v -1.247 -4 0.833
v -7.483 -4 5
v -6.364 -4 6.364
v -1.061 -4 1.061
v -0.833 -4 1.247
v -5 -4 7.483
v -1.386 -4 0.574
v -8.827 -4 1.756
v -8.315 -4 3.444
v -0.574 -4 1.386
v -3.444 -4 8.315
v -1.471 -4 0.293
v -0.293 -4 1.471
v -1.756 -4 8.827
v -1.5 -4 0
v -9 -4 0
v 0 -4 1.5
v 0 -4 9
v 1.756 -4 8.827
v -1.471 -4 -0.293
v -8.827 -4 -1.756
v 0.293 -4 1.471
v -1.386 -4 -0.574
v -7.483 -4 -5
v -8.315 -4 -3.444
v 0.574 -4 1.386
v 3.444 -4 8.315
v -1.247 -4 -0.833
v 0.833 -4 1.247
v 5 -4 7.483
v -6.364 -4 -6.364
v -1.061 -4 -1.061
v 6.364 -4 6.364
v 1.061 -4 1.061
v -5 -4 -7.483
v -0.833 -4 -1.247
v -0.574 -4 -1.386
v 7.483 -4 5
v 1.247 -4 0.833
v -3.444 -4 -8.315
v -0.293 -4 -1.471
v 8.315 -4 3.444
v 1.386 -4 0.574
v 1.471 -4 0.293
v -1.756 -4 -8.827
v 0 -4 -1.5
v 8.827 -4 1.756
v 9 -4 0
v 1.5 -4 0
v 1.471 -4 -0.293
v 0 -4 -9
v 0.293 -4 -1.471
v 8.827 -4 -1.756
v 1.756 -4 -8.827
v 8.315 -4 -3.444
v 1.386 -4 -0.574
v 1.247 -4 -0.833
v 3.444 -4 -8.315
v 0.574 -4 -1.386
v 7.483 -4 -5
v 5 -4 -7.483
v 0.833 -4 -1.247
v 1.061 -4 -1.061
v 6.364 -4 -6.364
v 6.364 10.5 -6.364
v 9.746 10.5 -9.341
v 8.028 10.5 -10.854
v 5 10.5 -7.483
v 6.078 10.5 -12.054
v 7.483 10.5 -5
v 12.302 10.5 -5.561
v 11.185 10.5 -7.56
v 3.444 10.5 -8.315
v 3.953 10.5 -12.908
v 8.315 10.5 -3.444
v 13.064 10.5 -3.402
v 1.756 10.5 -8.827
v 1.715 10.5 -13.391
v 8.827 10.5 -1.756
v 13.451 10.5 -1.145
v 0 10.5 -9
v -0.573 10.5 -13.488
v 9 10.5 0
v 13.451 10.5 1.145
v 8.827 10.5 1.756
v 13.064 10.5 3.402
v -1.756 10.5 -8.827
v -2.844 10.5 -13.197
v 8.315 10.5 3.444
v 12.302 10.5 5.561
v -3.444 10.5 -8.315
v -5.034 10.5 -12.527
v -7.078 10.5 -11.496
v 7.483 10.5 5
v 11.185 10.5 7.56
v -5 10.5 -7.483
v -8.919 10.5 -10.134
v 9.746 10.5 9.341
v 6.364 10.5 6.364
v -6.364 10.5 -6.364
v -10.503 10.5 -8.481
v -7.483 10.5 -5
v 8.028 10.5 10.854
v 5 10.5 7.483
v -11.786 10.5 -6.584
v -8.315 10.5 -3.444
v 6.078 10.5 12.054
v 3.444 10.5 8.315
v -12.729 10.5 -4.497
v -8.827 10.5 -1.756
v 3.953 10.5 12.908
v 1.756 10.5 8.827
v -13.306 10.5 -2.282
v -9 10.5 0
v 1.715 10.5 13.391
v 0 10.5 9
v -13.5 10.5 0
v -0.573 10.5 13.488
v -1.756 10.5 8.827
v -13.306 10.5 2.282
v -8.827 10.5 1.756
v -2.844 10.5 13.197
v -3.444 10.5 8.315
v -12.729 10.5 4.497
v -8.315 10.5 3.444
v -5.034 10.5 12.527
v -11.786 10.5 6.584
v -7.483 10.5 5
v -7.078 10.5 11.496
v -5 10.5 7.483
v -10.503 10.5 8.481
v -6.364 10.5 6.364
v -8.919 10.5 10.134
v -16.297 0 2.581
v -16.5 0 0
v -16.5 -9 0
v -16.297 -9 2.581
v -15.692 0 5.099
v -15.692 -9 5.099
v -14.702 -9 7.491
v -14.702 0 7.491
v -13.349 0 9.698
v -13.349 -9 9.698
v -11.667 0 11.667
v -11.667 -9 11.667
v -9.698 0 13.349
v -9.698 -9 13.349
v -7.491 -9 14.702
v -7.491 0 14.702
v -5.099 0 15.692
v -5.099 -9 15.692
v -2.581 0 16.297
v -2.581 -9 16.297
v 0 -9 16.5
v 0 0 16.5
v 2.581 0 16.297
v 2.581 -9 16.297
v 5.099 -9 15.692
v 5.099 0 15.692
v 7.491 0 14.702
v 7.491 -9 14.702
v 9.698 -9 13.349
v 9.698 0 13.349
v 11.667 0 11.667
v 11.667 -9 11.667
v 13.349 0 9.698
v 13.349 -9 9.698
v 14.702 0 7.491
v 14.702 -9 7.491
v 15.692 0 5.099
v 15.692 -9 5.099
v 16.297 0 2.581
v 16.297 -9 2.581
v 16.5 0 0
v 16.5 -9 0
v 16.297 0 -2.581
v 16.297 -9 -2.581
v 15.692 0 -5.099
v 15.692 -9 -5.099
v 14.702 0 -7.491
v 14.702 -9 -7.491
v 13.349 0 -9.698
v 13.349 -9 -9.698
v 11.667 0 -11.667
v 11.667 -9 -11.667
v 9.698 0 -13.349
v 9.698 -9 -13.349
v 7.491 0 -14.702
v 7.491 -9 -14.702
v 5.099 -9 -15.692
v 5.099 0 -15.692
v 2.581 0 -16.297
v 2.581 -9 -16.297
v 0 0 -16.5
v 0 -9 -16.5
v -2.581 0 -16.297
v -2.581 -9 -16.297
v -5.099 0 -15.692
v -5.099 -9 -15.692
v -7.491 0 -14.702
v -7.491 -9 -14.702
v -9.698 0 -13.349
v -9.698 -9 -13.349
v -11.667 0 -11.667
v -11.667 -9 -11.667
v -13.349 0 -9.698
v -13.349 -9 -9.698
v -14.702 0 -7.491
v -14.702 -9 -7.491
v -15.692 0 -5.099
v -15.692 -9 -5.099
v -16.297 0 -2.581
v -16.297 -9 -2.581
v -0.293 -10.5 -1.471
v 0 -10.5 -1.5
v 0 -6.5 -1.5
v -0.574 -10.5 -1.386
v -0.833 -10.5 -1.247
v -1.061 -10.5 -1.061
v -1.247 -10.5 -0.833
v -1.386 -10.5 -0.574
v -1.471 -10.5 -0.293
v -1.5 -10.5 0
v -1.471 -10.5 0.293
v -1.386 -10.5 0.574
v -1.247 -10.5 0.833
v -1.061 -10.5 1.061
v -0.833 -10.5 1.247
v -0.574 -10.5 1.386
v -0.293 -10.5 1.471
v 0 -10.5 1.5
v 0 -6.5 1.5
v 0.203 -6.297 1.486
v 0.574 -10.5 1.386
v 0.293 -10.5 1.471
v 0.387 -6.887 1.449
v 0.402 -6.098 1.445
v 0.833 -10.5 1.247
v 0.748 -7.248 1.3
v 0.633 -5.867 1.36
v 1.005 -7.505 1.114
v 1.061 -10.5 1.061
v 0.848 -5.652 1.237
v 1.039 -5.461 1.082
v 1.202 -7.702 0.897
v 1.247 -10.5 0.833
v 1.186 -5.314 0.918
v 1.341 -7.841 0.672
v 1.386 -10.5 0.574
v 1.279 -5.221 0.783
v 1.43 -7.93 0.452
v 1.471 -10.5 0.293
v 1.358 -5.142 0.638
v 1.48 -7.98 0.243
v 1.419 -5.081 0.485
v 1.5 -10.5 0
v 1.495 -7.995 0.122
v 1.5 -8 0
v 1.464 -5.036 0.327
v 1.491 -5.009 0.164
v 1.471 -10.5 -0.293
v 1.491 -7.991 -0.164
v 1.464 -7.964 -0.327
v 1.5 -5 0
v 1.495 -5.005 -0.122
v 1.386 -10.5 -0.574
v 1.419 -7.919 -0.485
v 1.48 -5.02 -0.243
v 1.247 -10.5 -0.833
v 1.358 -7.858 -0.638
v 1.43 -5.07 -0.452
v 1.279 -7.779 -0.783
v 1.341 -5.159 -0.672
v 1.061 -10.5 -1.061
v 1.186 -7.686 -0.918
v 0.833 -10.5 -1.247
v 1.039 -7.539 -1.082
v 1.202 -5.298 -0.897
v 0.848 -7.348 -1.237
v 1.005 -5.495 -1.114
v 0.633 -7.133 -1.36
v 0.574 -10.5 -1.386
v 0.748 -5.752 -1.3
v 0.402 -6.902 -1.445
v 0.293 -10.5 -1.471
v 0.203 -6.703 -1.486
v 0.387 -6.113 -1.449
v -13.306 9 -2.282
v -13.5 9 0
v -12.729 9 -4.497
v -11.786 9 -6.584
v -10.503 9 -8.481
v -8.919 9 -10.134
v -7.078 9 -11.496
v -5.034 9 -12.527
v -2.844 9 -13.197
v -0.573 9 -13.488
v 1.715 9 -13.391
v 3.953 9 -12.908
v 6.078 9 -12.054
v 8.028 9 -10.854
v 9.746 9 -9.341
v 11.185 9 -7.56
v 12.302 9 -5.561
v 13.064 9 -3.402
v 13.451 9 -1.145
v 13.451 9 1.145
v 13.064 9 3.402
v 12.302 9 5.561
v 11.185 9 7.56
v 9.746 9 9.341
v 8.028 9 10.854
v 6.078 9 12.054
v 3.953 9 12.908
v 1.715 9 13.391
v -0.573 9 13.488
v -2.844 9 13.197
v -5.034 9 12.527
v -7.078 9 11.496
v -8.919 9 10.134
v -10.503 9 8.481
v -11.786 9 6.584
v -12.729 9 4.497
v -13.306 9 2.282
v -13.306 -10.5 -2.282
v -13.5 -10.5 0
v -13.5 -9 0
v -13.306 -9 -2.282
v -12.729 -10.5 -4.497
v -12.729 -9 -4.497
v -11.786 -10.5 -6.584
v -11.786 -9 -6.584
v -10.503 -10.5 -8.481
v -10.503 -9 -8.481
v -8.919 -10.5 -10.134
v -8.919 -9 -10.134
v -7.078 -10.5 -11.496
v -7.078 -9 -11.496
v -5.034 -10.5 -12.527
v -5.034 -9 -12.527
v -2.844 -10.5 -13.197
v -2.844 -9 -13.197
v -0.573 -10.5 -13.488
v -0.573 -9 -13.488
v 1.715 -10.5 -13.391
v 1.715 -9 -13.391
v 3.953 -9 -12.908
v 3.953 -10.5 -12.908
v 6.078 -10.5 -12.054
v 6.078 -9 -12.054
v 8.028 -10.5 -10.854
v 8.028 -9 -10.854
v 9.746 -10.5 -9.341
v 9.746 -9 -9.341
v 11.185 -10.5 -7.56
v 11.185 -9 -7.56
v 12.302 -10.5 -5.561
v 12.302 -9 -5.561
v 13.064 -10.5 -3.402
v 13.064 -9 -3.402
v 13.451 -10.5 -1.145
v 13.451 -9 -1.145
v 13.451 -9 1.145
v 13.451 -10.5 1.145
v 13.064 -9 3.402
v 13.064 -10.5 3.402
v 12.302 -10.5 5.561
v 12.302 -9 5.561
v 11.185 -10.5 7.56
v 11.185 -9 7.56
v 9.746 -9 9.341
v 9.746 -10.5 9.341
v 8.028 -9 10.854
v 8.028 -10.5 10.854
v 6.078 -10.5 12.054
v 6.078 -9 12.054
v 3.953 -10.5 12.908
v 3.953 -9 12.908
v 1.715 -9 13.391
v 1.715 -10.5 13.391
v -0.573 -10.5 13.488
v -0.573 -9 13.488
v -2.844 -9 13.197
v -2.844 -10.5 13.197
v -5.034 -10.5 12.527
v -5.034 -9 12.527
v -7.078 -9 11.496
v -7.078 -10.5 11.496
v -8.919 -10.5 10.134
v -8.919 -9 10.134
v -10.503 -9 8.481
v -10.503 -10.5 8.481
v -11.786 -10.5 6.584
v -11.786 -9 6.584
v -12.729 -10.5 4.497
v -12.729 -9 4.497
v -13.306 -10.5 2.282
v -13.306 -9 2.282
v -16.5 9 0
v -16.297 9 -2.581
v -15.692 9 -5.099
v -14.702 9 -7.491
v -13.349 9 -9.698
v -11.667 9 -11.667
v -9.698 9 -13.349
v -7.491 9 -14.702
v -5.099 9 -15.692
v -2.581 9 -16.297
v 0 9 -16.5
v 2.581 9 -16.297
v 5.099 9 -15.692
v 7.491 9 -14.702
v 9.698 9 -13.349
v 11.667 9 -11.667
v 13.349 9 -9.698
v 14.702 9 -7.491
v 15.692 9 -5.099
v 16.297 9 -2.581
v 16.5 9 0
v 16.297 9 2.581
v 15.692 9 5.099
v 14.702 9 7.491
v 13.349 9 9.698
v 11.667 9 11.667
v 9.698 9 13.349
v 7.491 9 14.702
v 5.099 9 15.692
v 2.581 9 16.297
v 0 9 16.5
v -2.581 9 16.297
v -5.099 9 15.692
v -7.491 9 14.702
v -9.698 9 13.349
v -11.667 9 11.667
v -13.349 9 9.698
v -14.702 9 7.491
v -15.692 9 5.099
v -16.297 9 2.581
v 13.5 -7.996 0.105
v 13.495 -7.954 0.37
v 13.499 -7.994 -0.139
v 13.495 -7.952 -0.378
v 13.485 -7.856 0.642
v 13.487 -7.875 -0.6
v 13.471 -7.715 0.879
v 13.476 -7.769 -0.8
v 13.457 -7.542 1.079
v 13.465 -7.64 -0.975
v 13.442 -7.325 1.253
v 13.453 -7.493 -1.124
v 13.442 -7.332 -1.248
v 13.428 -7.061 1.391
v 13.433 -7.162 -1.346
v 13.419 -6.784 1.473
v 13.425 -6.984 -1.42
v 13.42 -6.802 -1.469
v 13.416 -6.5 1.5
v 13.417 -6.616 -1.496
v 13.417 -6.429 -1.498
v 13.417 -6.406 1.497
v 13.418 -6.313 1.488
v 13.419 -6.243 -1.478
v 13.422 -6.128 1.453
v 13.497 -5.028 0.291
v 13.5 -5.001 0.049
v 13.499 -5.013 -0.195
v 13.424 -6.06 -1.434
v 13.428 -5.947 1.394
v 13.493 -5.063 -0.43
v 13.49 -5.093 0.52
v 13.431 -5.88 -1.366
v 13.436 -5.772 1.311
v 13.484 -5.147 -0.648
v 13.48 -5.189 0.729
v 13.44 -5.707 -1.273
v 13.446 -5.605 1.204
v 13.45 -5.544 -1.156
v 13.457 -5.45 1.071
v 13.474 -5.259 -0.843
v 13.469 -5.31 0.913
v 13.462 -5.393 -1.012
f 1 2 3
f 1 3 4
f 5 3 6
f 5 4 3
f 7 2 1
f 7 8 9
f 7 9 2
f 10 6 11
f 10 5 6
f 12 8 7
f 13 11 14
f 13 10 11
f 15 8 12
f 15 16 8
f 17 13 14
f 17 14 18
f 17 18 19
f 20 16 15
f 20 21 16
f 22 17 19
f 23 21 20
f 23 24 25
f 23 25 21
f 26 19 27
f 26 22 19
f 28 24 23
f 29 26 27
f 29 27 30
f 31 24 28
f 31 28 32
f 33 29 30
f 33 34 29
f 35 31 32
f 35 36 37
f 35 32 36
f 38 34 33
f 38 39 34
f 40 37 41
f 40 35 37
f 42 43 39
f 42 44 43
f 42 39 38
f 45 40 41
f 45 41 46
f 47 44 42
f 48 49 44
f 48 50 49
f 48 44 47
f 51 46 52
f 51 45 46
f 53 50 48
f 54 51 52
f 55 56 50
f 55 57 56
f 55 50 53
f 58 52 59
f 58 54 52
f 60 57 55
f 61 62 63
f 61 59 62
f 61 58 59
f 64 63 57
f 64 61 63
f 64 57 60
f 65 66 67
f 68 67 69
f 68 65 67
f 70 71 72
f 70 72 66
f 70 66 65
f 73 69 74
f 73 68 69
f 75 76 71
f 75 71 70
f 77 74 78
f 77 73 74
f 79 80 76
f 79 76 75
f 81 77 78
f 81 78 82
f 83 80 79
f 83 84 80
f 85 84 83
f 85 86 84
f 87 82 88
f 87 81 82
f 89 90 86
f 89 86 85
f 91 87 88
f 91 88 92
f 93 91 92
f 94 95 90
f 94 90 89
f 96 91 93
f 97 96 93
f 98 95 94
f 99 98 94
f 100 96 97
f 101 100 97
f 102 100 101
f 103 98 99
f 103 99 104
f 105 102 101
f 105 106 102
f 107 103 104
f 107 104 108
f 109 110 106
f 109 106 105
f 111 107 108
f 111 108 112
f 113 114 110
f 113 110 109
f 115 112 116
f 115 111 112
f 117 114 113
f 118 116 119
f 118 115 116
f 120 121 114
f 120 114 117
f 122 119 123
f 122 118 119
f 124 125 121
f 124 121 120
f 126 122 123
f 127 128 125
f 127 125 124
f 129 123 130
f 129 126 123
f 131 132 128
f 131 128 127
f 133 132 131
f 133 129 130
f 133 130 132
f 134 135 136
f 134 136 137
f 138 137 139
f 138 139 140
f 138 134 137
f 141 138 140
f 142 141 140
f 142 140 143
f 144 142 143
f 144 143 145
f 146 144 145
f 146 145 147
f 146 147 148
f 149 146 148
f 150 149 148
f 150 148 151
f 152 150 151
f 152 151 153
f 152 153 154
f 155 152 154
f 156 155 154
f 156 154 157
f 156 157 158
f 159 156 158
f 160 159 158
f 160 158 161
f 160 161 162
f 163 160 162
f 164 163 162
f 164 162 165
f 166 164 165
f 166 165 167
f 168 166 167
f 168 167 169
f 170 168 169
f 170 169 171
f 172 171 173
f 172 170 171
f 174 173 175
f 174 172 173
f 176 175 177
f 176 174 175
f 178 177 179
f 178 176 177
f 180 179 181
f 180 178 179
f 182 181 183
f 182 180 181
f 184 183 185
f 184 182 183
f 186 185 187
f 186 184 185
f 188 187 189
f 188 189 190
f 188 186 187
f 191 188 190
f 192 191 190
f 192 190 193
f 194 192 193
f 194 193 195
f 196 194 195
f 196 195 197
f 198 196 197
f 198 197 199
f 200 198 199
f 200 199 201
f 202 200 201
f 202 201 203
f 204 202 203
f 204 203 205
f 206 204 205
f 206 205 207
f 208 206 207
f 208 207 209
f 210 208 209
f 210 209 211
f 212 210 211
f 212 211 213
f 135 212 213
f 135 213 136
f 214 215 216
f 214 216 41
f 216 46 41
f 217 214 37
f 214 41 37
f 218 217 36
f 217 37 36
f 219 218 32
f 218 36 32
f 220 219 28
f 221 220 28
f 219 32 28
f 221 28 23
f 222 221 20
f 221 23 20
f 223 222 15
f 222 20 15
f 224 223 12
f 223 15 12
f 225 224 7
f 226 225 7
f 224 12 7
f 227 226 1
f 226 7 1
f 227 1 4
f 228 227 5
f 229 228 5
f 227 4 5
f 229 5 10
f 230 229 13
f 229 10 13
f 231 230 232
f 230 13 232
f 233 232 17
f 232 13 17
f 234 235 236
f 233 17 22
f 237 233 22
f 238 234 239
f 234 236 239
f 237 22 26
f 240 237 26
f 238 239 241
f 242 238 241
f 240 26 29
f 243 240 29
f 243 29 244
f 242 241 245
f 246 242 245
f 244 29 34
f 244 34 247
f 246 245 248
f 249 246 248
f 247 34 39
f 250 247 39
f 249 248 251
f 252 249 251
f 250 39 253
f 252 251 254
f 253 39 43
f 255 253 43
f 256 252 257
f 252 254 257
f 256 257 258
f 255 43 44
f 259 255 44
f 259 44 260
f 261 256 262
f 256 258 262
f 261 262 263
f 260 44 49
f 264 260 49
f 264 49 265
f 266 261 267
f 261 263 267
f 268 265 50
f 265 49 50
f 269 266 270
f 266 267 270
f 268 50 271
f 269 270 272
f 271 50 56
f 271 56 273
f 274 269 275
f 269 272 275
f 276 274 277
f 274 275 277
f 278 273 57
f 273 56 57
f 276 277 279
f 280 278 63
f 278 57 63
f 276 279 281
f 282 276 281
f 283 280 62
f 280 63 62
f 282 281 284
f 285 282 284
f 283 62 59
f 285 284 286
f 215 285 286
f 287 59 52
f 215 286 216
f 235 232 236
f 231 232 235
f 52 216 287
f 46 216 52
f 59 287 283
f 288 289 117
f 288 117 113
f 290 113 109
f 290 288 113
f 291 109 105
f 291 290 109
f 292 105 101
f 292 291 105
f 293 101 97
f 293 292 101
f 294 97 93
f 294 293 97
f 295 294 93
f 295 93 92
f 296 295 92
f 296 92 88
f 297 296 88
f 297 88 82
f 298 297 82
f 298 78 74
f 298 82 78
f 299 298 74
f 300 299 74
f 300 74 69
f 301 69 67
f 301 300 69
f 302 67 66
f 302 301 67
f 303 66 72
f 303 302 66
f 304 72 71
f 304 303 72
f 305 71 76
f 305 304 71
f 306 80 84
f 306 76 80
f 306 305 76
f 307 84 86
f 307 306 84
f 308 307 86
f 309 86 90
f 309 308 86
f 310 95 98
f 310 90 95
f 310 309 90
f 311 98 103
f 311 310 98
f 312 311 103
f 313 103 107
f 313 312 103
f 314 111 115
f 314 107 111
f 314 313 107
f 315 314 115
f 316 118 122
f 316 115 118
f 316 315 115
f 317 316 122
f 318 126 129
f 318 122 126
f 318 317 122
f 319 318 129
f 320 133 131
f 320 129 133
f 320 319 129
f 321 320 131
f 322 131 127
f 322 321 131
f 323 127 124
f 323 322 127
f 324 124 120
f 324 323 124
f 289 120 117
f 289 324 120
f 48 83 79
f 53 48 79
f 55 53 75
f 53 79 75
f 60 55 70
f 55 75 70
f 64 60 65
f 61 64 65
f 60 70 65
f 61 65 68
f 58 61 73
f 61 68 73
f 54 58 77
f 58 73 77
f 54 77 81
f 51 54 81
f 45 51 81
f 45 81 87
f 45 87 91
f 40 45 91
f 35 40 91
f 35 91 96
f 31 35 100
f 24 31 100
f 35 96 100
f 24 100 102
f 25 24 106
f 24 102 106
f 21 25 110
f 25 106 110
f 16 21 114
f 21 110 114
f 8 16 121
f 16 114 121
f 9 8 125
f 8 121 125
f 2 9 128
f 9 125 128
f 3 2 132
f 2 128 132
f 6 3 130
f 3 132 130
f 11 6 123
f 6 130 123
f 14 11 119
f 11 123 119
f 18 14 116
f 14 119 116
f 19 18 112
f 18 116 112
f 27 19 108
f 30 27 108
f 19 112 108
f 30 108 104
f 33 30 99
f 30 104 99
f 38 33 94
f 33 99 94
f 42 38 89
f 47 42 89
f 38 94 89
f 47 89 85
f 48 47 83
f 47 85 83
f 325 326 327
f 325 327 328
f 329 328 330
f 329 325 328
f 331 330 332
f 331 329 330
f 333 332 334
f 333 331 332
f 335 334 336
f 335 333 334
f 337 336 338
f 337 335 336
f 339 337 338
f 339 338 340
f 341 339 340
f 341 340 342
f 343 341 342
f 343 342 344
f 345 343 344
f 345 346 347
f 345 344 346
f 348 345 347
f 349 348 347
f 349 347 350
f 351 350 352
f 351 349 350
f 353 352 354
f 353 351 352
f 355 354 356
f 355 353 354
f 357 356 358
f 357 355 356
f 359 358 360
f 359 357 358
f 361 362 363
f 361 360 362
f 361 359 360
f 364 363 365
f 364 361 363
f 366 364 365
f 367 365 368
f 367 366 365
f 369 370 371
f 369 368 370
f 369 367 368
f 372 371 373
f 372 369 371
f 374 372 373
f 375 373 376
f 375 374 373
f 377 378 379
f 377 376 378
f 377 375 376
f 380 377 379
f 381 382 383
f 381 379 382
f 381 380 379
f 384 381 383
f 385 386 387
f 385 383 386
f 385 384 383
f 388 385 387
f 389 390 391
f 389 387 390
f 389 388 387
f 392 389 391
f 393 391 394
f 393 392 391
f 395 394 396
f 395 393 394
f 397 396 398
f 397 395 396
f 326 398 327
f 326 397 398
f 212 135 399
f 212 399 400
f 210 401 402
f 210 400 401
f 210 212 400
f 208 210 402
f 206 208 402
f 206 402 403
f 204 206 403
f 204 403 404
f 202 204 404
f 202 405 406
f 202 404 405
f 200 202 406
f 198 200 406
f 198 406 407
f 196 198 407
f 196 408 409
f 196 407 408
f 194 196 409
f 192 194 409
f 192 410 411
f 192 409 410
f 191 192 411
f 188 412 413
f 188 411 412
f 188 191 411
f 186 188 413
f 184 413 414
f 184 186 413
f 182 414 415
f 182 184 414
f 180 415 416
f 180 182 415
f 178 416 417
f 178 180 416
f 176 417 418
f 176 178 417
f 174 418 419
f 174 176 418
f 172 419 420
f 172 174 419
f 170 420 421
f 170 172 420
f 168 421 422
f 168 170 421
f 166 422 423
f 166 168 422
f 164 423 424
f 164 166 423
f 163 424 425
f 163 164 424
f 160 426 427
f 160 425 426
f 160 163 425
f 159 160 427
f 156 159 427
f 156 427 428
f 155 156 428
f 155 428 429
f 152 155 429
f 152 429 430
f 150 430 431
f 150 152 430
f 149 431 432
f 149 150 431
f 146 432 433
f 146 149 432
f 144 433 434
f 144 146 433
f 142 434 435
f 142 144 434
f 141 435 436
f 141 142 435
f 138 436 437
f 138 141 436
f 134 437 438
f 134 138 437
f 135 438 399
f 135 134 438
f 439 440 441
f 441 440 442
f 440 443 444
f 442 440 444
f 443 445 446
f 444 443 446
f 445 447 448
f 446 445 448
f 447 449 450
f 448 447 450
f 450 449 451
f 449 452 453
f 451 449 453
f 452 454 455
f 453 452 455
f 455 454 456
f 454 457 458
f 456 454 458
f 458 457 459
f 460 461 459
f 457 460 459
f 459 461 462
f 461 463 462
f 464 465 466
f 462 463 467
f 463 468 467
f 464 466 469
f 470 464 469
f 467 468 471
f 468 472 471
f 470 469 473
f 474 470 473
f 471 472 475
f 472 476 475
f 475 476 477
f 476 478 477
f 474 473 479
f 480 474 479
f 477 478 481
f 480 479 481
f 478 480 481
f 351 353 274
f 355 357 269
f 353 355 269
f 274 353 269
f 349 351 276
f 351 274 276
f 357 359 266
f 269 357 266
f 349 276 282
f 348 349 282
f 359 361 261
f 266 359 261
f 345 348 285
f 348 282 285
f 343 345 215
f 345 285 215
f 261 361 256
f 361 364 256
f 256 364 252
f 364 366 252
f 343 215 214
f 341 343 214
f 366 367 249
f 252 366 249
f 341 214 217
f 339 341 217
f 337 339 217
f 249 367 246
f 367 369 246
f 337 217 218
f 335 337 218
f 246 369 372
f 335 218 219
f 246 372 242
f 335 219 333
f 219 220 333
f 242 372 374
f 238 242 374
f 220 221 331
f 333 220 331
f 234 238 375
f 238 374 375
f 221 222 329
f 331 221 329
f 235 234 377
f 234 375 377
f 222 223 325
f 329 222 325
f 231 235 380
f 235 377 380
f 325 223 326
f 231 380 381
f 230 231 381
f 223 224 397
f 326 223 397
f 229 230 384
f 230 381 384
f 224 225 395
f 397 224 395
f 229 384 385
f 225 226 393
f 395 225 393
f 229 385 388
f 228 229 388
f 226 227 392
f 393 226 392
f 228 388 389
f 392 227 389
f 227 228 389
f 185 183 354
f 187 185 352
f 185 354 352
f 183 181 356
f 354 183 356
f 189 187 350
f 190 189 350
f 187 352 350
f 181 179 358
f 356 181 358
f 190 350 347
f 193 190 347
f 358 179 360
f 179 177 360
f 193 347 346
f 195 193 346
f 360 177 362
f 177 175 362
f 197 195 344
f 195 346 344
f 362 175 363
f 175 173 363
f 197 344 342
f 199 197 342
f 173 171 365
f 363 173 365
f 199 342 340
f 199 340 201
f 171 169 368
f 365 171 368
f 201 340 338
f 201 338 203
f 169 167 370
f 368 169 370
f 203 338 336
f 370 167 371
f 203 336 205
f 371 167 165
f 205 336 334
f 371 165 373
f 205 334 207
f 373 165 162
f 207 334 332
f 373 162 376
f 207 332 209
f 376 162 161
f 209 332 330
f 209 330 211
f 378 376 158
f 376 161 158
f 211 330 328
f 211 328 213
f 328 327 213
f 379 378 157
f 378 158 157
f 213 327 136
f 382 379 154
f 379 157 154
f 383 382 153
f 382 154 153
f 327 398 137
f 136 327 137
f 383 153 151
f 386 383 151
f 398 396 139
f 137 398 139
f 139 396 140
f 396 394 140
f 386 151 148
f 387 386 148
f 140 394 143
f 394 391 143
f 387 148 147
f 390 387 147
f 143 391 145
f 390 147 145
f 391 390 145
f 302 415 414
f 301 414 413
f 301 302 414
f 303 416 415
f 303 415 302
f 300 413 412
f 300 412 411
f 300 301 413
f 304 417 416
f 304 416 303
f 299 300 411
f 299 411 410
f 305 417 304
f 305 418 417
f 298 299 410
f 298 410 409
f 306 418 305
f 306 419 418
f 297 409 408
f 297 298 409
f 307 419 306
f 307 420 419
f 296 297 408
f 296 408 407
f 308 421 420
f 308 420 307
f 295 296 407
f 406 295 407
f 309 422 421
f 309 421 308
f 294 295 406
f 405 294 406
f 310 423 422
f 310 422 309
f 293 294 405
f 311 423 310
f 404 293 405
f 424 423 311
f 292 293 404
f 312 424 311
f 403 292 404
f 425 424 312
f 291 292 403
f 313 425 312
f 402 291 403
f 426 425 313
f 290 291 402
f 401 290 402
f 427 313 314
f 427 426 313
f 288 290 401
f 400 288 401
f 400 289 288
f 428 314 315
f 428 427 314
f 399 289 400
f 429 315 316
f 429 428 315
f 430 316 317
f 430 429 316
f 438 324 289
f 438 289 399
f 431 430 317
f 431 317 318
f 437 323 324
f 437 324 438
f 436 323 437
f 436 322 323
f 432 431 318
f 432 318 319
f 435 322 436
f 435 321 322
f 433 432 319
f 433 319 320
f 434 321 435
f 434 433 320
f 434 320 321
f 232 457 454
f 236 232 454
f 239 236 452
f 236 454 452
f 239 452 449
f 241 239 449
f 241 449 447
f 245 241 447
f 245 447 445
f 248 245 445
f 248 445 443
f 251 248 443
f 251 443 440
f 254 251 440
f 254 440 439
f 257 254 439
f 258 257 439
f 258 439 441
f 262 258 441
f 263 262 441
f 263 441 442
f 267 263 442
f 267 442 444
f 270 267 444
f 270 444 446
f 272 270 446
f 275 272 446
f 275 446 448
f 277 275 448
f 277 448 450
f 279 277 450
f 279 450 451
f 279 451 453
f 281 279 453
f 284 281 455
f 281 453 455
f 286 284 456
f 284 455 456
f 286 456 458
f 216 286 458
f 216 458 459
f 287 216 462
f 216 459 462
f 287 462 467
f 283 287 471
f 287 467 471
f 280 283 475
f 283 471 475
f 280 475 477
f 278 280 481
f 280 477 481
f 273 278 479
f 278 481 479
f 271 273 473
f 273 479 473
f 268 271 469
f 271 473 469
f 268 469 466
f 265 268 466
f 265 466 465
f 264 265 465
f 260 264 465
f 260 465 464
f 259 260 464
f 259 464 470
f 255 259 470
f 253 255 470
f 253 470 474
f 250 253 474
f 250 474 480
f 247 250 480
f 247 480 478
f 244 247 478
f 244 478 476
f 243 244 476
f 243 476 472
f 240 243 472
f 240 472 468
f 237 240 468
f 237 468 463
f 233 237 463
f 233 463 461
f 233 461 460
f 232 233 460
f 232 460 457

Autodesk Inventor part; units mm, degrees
ref_plane "YZ Plane" through (0, 0, 0) normal (1, 0, 0) x (0, 1, 0)
ref_plane "XZ Plane" through (0, 0, 0) normal (0, 1, 0) x (-1, 0, 0)
ref_plane "XY Plane" through (0, 0, 0) normal (0, 0, 1) x (1, 0, 0)
sketch "Náčrt1" plane through (0, 0, 0) normal (0, 1, 0) x (-1, 0, 0)
  circle A0 centre (0, 0) radius 16.5
  circle A1 centre (0, 0) radius 13.5
  dimension "d0" = 33
  dimension "d1" = 27
extrude "Vysunutí1" add sketch "Náčrt1" along normal mid plane 21 contours A1
sketch "Náčrt4" plane through (0, 0, 0) normal (1, 0, 0) x (0, 1, 0)
  line L0 (-10.5, 13.5) -> (-10.5, -13.5) projected
  point P0 (0, 0)
  point P1 (-6.5, 0)
  dimension "d16" = 4
hole "Díra2" at (0, -6.5, 0) direction (1, 0, 0) diameter 3 end through all
thread "Závit1" size "M3x0.5" class "6H" standard "ISO Metric profile" full length
extrude "Vysunutí2" add sketch "Náčrt1" along normal mid plane 18
sketch "Náčrt2" plane through (0, 10.5, 0) normal (0, 1, 0) x (1, 0, 0)
  circle A0 centre (0, 0) radius 9
  dimension "d6" = 18
extrude "Vysunutí3" cut sketch "Náčrt2" against normal blind 14.5
sketch "Náčrt3" plane through (0, -10.5, 0) normal (0, -1, 0) x (1, 0, 0)
  circle A0 centre (0, 0) radius 13.5 projected
hole "Díra1" at (0, -10.5, 0) direction (0, 1, 0) diameter 3 end through all
properties part number "JSUMO_Wheel_33x20mm"
